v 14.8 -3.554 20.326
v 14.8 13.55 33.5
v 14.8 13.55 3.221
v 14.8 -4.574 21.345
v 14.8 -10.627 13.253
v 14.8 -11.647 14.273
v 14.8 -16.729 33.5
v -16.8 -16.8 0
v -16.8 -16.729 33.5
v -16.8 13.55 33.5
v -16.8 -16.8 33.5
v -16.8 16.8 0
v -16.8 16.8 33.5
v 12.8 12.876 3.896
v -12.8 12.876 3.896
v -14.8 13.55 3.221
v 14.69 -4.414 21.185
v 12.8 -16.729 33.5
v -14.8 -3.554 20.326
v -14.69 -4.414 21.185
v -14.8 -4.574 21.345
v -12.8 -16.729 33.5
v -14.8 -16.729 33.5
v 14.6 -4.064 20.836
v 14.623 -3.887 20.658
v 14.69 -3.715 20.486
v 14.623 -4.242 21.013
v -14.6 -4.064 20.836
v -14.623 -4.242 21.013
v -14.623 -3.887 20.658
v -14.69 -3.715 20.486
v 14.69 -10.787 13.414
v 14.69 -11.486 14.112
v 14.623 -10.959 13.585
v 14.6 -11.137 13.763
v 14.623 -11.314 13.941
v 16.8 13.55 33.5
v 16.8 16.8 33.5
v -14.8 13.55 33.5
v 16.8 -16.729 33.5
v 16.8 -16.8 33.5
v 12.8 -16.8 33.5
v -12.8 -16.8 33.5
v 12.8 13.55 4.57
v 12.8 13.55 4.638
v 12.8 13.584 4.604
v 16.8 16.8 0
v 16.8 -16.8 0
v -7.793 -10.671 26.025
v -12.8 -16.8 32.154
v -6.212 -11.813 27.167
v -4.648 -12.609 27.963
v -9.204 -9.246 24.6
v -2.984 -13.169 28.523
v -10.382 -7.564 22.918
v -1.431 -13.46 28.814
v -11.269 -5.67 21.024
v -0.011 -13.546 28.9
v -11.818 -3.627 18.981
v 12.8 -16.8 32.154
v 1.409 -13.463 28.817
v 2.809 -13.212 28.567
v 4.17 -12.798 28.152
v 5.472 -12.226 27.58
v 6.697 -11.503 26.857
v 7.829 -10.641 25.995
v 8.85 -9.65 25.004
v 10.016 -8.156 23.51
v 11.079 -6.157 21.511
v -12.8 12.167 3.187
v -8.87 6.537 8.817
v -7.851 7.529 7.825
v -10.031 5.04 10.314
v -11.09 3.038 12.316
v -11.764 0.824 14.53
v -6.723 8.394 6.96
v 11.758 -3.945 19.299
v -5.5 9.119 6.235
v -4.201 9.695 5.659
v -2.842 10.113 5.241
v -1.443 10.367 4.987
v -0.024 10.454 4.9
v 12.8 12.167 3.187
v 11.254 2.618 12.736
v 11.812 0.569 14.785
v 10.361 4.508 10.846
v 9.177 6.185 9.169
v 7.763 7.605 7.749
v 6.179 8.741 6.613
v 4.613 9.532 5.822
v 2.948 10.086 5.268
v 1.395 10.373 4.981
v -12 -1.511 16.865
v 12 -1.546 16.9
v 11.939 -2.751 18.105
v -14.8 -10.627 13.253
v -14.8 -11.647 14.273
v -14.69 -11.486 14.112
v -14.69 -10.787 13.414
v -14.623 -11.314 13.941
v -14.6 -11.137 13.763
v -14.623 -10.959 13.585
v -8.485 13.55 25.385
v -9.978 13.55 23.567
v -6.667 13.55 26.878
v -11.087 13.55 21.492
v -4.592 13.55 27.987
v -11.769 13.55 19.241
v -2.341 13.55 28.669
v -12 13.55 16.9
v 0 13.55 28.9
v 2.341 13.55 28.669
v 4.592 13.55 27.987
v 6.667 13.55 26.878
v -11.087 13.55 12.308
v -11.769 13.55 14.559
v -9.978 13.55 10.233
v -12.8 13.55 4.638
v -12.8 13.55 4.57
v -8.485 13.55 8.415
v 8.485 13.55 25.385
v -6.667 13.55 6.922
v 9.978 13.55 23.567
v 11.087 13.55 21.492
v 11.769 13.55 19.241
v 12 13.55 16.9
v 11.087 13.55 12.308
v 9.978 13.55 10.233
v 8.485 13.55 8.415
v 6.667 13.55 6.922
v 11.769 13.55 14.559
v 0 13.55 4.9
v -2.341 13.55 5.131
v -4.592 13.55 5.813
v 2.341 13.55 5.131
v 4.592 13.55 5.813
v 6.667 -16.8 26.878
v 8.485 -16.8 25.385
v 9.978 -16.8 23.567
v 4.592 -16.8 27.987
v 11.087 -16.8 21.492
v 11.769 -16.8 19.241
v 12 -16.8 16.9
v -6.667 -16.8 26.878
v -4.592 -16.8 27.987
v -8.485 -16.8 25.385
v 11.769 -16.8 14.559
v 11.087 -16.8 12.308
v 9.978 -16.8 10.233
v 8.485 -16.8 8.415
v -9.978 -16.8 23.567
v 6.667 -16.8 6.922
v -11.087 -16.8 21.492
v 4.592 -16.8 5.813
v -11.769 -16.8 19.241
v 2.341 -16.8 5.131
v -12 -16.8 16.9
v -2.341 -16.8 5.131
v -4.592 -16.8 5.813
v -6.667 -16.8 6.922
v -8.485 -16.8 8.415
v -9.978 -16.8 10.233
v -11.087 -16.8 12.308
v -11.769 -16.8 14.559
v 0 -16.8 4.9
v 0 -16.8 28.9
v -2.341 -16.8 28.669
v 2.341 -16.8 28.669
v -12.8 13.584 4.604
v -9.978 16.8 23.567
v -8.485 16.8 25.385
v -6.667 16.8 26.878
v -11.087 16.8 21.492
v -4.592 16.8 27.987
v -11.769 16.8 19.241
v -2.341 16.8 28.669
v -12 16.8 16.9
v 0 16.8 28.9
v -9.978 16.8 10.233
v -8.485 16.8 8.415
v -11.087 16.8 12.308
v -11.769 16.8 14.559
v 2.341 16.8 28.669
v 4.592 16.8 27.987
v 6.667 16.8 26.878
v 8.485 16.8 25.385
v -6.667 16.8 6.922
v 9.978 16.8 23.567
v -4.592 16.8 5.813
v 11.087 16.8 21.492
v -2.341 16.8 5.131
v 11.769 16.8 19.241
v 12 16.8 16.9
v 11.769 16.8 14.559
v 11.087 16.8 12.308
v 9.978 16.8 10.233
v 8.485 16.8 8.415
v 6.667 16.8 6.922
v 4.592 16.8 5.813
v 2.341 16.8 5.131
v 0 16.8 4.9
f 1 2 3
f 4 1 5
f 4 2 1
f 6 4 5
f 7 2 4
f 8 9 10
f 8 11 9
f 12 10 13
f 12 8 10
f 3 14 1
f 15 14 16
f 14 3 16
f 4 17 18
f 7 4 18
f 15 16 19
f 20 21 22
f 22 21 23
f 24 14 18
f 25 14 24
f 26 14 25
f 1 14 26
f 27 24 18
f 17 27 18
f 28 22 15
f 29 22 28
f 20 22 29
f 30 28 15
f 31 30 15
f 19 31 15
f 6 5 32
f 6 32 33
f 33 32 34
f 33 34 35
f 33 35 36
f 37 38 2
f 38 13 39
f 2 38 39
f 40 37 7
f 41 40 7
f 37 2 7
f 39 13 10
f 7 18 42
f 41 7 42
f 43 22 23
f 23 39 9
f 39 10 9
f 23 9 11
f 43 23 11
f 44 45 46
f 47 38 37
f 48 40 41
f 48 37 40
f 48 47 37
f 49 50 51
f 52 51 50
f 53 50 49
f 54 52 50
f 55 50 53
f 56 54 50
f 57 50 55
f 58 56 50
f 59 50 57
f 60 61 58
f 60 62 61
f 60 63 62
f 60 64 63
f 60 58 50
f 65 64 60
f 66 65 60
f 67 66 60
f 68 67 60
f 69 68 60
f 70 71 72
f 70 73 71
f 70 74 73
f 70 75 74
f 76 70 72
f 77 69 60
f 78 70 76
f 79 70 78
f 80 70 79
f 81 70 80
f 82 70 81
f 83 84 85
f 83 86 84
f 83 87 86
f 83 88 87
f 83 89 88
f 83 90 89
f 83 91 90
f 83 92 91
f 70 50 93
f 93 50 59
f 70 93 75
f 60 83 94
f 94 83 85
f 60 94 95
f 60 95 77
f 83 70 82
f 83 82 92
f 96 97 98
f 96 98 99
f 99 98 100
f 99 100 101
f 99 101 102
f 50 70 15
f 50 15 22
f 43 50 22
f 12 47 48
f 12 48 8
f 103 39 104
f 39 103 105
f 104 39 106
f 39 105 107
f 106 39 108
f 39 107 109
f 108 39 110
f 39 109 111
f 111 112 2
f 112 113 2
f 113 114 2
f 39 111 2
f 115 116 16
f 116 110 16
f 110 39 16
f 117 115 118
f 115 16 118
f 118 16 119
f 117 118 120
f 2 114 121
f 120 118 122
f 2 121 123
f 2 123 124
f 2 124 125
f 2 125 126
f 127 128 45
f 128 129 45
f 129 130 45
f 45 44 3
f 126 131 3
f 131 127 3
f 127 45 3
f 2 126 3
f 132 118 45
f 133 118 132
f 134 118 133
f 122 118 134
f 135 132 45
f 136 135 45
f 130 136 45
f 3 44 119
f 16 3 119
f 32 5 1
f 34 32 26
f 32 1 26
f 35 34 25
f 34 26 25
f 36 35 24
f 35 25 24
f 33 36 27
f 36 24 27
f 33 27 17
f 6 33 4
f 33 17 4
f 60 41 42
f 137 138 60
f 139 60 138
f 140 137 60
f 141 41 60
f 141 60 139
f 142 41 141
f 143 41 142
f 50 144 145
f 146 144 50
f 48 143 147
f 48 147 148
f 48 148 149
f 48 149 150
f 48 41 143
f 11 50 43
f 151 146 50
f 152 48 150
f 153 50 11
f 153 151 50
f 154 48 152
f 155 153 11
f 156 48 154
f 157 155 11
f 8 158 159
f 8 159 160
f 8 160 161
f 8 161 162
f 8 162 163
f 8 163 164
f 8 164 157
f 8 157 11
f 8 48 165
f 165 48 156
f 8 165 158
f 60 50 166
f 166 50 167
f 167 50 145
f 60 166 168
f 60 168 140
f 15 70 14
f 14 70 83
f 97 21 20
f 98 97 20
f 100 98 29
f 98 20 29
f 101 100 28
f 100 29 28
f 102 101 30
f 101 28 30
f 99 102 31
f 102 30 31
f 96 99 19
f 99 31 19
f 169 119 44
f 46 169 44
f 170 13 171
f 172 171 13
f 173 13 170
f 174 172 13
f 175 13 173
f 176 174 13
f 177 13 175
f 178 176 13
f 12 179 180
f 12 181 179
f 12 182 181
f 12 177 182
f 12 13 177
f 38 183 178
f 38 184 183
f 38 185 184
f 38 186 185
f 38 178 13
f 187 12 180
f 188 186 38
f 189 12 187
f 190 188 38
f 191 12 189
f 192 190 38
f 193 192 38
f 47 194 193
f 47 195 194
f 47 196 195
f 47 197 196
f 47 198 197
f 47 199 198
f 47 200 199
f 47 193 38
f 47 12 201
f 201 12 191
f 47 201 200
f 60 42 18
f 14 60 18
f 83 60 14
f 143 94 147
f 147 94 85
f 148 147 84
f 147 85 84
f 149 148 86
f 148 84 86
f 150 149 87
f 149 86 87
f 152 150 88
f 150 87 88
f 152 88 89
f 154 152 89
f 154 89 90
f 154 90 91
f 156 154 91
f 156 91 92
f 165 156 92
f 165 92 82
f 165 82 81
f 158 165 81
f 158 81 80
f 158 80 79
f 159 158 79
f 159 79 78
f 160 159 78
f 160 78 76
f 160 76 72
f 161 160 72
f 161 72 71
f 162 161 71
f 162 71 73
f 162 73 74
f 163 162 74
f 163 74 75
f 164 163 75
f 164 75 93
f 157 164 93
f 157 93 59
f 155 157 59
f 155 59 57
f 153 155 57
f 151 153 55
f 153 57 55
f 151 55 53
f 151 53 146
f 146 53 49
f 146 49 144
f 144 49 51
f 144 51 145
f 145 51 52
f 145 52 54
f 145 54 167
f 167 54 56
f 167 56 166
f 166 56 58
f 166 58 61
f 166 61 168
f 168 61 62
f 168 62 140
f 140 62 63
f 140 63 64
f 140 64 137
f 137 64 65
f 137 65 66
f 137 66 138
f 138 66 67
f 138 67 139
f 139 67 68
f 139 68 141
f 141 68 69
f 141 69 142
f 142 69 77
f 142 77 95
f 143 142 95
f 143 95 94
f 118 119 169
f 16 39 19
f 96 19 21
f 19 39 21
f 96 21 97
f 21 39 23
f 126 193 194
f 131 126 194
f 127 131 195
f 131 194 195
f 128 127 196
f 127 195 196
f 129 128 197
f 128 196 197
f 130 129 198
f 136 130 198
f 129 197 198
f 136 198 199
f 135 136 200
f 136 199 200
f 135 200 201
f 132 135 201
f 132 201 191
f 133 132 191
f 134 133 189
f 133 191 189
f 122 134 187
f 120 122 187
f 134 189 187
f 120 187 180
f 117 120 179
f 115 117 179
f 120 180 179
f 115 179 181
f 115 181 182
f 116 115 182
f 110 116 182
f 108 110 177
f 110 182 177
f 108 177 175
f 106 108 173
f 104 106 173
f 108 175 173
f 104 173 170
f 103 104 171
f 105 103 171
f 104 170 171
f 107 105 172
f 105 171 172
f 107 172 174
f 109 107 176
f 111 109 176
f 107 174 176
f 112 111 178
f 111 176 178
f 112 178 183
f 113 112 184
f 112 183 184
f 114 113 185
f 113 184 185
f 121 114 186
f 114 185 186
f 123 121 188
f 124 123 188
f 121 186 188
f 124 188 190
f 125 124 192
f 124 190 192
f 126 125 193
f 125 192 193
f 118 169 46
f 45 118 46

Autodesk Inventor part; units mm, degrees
ref_plane "YZ Plane" through (0, 0, 0) normal (1, 0, 0) x (0, 1, 0)
sketch "Sketch1" plane through (0, 0, 0) normal (0, 0, 1) x (1, 0, 0)
  line L0 (-34.86, 0) -> (34.86, 0) construction
  line L1 (0, -34.86) -> (0, 34.86) construction
  line L2 (0, 0) -> (16.9726, 16.9726) construction
  line L3 (0, 0) -> (24.0028, 0) construction
  line L4 (0, 24.9) -> (16.8009, 24.9)
  line L5 (16.8009, 24.9) -> (16.8009, 21.2415)
  line L6 (16.8009, 21.2415) -> (19.0212, 19.0212)
  line L7 (24.9, 0) -> (24.9, 16.8009)
  line L8 (24.9, 16.8009) -> (21.2415, 16.8009)
  line L9 (21.2415, 16.8009) -> (19.0212, 19.0212)
  line L10 (0, -24.9) -> (16.8009, -24.9)
  line L11 (16.8009, -24.9) -> (16.8009, -21.2415)
  line L12 (16.8009, -21.2415) -> (19.0212, -19.0212)
  line L13 (24.9, 0) -> (24.9, -16.8009)
  line L14 (24.9, -16.8009) -> (21.2415, -16.8009)
  line L15 (21.2415, -16.8009) -> (19.0212, -19.0212)
  line L16 (0, 0) -> (-16.9726, 16.9726) construction
  line L17 (0, 0) -> (-24.0028, 0) construction
  line L18 (0, 24.9) -> (-16.8009, 24.9)
  line L19 (-16.8009, 24.9) -> (-16.8009, 21.2415)
  line L20 (-16.8009, 21.2415) -> (-19.0212, 19.0212)
  line L21 (-24.9, 0) -> (-24.9, 16.8009)
  line L22 (-24.9, 16.8009) -> (-21.2415, 16.8009)
  line L23 (-21.2415, 16.8009) -> (-19.0212, 19.0212)
  line L24 (0, -24.9) -> (-16.8009, -24.9)
  line L25 (-16.8009, -24.9) -> (-16.8009, -21.2415)
  line L26 (-16.8009, -21.2415) -> (-19.0212, -19.0212)
  line L27 (-21.2415, -16.8009) -> (-19.0212, -19.0212)
  line L28 (-24.9, -16.8009) -> (-21.2415, -16.8009)
  line L29 (-24.9, 0) -> (-24.9, -16.8009)
  circle A0 centre (0, 0) radius 7.5
  dimension "d17" = 45
  dimension "d18" = 24.9
  dimension "d20" = 3.14
  dimension "d21" = 26.9
  dimension "d22" = 15
extrude "Extrusion1" add sketch "Sketch1" along normal blind 3 contours L4 L5 L6 L9 L8 L7 L13 L14 L15 L12 L11 L10 L24 L25 L26 L27 L28 L29 L21 L22 L23 L20 L19 L18 | A0
sketch "Sketch6" plane through (0, 0, 3) normal (0, 0, 1) x (1, 0, 0)
  line L0 (16.8009, 24.9) -> (-16.8009, 24.9) projected
  line L1 (-16.8009, 24.9) -> (-16.8009, 21.2415) projected
  line L2 (-16.8009, 21.2415) -> (-21.2415, 16.8009) projected
  line L3 (-21.2415, 16.8009) -> (-24.9, 16.8009) projected
  line L4 (-24.9, 16.8009) -> (-24.9, -16.8009) projected
  line L5 (-24.9, -16.8009) -> (-21.2415, -16.8009) projected
  line L6 (-21.2415, -16.8009) -> (-16.8009, -21.2415) projected
  line L7 (-16.8009, -21.2415) -> (-16.8009, -24.9) projected
  line L8 (-16.8009, -24.9) -> (16.8009, -24.9) projected
  line L9 (16.8009, -24.9) -> (16.8009, -21.2415) projected
  line L10 (16.8009, -21.2415) -> (21.2415, -16.8009) projected
  line L11 (21.2415, -16.8009) -> (24.9, -16.8009) projected
  line L12 (24.9, -16.8009) -> (24.9, 16.8009) projected
  line L13 (24.9, 16.8009) -> (21.2415, 16.8009) projected
  line L14 (21.2415, 16.8009) -> (16.8009, 21.2415) projected
  line L15 (16.8009, 21.2415) -> (16.8009, 24.9) projected
  line L16 (24.9, -16.8009) -> (24.9, 16.8009) projected
  line L17 (24.9, 13.5502) -> (-24.9, 13.5502)
  line L18 (-24.9, 16.8009) -> (-24.9, -16.8009) projected
  point P0 (0, 0)
ref_plane "Work Plane2" through (-27.39, -0.0644, 16.8356) normal (0, -0.7071, -0.7071) x (0, 0.7071, -0.7071)
extrude "Extrusion6" add sketch "Sketch6" along normal up to surface contours L12 L11 L10 L9 L8 L7 L6 L5 L4 L17 surface through (-27.39, -0.0644, 16.8356) normal (0, -0.7071, -0.7071)
sketch "Sketch7" plane through (-16.8009, -24.9, 0) normal (0, -1, 0) x (1, 0, 0)
  line L0 (-0.0991, 33.8) -> (0.8009, 33.8) projected
  arc A0 (-6.0991, 41.8) -> (-8.0991, 39.8) centre (-6.0991, 39.8) ccw projected
  arc A1 (41.7009, 39.8) -> (39.7009, 41.8) centre (39.7009, 39.8) ccw projected
  line L1 (41.9057, 41.8) -> (-10.6447, 41.8)
  line L2 (-10.6447, 41.8) -> (-10.6447, 33.8)
  line L3 (-10.6447, 33.8) -> (41.9057, 33.8)
  line L4 (41.9057, 33.8) -> (41.9057, 41.8)
  point P0 (16.8009, 0)
extrude "Extrusion7" cut sketch "Sketch7" against normal through all
sketch "Sketch8" plane through (21.2415, -16.8009, 0) normal (0, -1, 0) x (1, 0, 0)
  line L0 (-8.7415, 0) -> (-33.7415, 0) projected
  line L1 (-33.7415, -1) -> (-8.7415, -1) projected
  line L2 (-46.1415, 33.572) -> (-42.483, 33.572) projected
  line L3 (3.6585, 33.8) -> (0.0423, 33.8) projected
  line L4 (0, 33.572) -> (3.6585, 33.572) projected
  line L5 (-46.1415, 3.2209) -> (-46.1415, 33.572) projected
  line L6 (3.6585, 33.572) -> (-46.1415, 33.572)
  line L7 (-46.1415, 33.572) -> (-46.1415, 30.572)
  line L8 (-46.1415, 30.572) -> (3.6585, 30.572)
  line L9 (3.6585, 30.572) -> (3.6585, 33.572)
  dimension "d45" = 3
sketch "Sketch9" plane through (-16.8009, -24.9, 0) normal (0, -1, 0) x (1, 0, 0)
  line L0 (33.7009, 0) -> (33.0009, 0) construction
  line L1 (36.0327, -6) -> (22.7009, -6) construction
  circle A0 centre (16.8009, 16.9) radius 16.9 construction
  circle A1 centre (16.8009, 16.9) radius 7.5
  line L2 (39.7009, 8.1978) -> (33.7009, 8.1978) projected
  line L3 (33.7009, 8.1978) -> (33.7009, 0) projected
  line L4 (33.0009, 0) -> (33.0009, -3.7) projected
  line L5 (33.0009, -3.7) -> (22.7009, -3.7) projected
  line L6 (22.7009, -3.7) -> (22.7009, -6) projected
  arc A2 (39.7009, -2.3319) -> (36.0327, -6) centre (36.8009, -3.1) ccw projected
  line L7 (39.7009, 8.1978) -> (39.7009, -2.3319) projected
  point P0 (16.8009, 0)
  dimension "d46" = 15
extrude "Extrusion8" cut sketch "Sketch9" against normal through all
sketch "Sketch10" plane through (-16.8009, -24.9, 0) normal (0, -1, 0) x (1, 0, 0)
  circle A0 centre (16.8009, 16.9) radius 7.5 projected
  circle A1 centre (16.8009, 16.9) radius 12.75
  point P0 (16.8009, 0)
  dimension "d49" = 25.5
extrude "Extrusion9" cut sketch "Sketch10" against normal blind 7
sketch "Sketch12" plane through (-24.9, 13.5502, 3.2209) normal (0, 0.7071, 0.7071) x (1, 0, 0)
  line L0 (32.9, -31.2053) -> (32.9, -6.2053) construction
  line L1 (32.9, -6.2053) -> (16.9, -6.2053) construction
  line L2 (16.9, -6.2053) -> (16.9, -31.2053) construction
  line L3 (16.9, -31.2053) -> (32.9, -31.2053) construction
  line L4 (37.7, -37.554) -> (12.1, -37.554)
  line L5 (12.1, -37.554) -> (12.1, -0.954)
  line L6 (12.1, -0.954) -> (37.7, -0.954)
  line L7 (37.7, -0.954) -> (37.7, -37.554)
  line L8 (37.7, -37.554) -> (12.1, -0.954) construction
  line L9 (12.1, -37.554) -> (37.7, -0.954) construction
  line L10 (10.6, -39.054) -> (39.2, -39.054)
  line L11 (39.2, -39.054) -> (39.2, 0.546)
  line L12 (39.2, 0.546) -> (10.6, 0.546)
  line L13 (10.6, 0.546) -> (10.6, -39.054)
  point P0 (24.9, -19.254)
  point P1 (24.9, -8.7385)
  point P2 (24.9, -8.7385)
  dimension "d81" = 25.6
  dimension "d82" = 36.6
  dimension "d83" = 1.5
sketch "Sketch13" plane through (0, 0, 3) normal (0, 0, 1) x (1, 0, 0)
  line L0 (24.9, 13.5502) -> (24.9, 16.8009) projected
  line L1 (24.9, 16.8009) -> (21.2415, 16.8009) projected
  line L2 (21.2415, 16.8009) -> (16.8009, 21.2415) projected
  line L3 (16.8009, 21.2415) -> (16.8009, 24.9) projected
  line L4 (16.8009, 24.9) -> (-16.8009, 24.9) projected
  line L5 (-16.8009, 24.9) -> (-16.8009, 21.2415) projected
  line L6 (-16.8009, 21.2415) -> (-21.2415, 16.8009) projected
  line L7 (-21.2415, 16.8009) -> (-24.9, 16.8009) projected
  line L8 (-24.9, 16.8009) -> (-24.9, 13.5502) projected
  line L9 (-24.9, 13.5502) -> (24.9, 13.5502) projected
  point P0 (0, 0)
ref_plane "Work Plane3" through (-16.9, 21.1423, 33.8) normal (0, 0, -1) x (0, 1, 0)
extrude "Extrusion12" add sketch "Sketch13" along normal up to surface (30.8 mm away)
sketch "Sketch14" plane through (-16.8009, 24.9, 0) normal (0, 1, 0) x (1, 0, 0)
  line L0 (-0.0991, -33.8) -> (-0.0991, 0) construction
  line L1 (33.6017, -33.8) -> (0, -33.8) projected
  line L2 (0, 0) -> (33.6017, 0) projected
  line L3 (33.6017, 0) -> (33.6017, -33.8) projected
  arc A0 (16.8009, -9.4) -> (16.8009, -9.4) centre (16.8009, -16.9) ccw construction
  circle A1 centre (16.8009, -16.9) radius 12.75
  point P0 (16.8009, 0)
  dimension "d61" = 25.5
extrude "Extrusion13" cut sketch "Sketch14" against normal blind 7
sketch "Sketch15" plane through (0, 17.9, 16.9) normal (0, 1, 0) x (1, 0, 0)
  circle A0 centre (0, 0) radius 7.5 projected
  circle A1 centre (0, 0) radius 12
  point P0 (0, 16.9)
  dimension "d84" = 24
extrude "Extrusion14" cut sketch "Sketch15" against normal through all contours A0 | A1
sketch "Sketch16" plane through (21.2415, -16.8009, 33.572) normal (0, 0.7071, 0.7071) x (1, 0, 0)
  line L0 (-42.255, -0.3224) -> (-0.228, -0.3224) projected
  line L1 (-0.228, -0.3224) -> (0, 0) projected
  line L2 (0, 0) -> (3.6585, 0) projected
  line L3 (3.6585, 0) -> (3.6585, 42.9229) projected
  line L4 (-46.1415, 42.9229) -> (-46.1415, 0) projected
  line L5 (-46.1415, 0) -> (-42.483, 0) projected
  line L6 (-42.483, 0) -> (-42.255, -0.3224) projected
  line L7 (-4.4406, 18.0121) -> (-38.0423, 18.0121) projected
  circle A0 centre (-37.2415, 18.0121) radius 1.4
  circle A1 centre (-5.2415, 18.0121) radius 1.4
  line L8 (3.6585, 42.9229) -> (-46.1415, 42.9229) projected
  ellipse E0 centre (-21.2415, 23.5778) end of major axis (-21.2415, 40.5484) minor radius 12 projected
  point P0 (-21.2415, 35.619)
  dimension "d68" = 2.8
  dimension "d69" = 2.8
  dimension "d85" = 16
extrude "Extrusion15" cut sketch "Sketch16" against normal blind 10 contours A0 | A1
sketch "Sketch17" plane through (-24.9, -16.8009, 0) normal (-1, 0, 0) x (0, 0, 1)
  line L0 (43.2726, 50.002) -> (33.5, 50.002)
  line L1 (33.5, 50.002) -> (33.5, -21.818)
  line L2 (33.5, -21.818) -> (43.2726, -21.818)
  line L3 (43.2726, -21.818) -> (43.2726, 50.002)
  line L4 (0, 0) -> (0, 33.6017) projected
  point P0 (0, 16.8009)
  dimension "d72" = 33.5
extrude "Extrusion16" cut sketch "Sketch17" against normal through all
ref_plane "Work Plane4" through (-12.8, -13.0045, 29.7756) normal (0, 0.7071, 0.7071) x (1, 0, 0)
sketch "Sketch19" plane through (-12.8, -13.0045, 29.7756) normal (0, 0.7071, 0.7071) x (1, 0, 0)
  line L0 (0, 36.554) -> (-1.5, 36.554) projected
  line L1 (-1.5, 36.554) -> (-1.5, -1.5) projected
  line L2 (-1.5, -1.5) -> (27.1, -1.5) projected
  line L3 (27.1, -1.5) -> (27.1, 36.554) projected
  line L4 (27.1, 36.554) -> (25.6, 36.554) projected
  line L5 (25.6, 36.554) -> (25.6, 0) projected
  line L6 (25.6, 0) -> (0, 0) projected
  line L7 (0, 0) -> (0, 36.554) projected
  line L8 (25.6, 0) -> (25.6, 36.6) projected
  line L9 (0, 0) -> (25.6, 0) projected
  line L10 (0, 36.6) -> (0, 0) projected
  line L11 (25.6, -1.5) -> (0, -1.5)
  line L12 (0, -1.5) -> (0, 36.6)
  line L13 (0, 36.6) -> (25.6, 36.6)
  line L14 (25.6, 36.6) -> (25.6, -1.5)
  line L15 (25.6, -1.5) -> (0, -1.5)
  line L16 (0, -1.5) -> (0, -6.2491)
  line L17 (0, -6.2491) -> (25.6, -6.2491)
  line L18 (25.6, -6.2491) -> (25.6, -1.5)
  point P0 (12.8, 30.2501)
extrude "Extrusion18" cut sketch "Sketch19" along normal mid plane 2 contours L10 L13 L8 L5 L6 L7 | L6 L14 L2 L12 | L2 L18 L17 L16
sketch "Sketch21" plane through (0, 0, 0) normal (0, 0, -1) x (-1, 0, 0)
  line L0 (16.8009, -24.9) -> (16.8009, -21.2415) projected
  line L1 (16.8009, -21.2415) -> (21.2415, -16.8009) projected
  line L2 (21.2415, -16.8009) -> (24.9, -16.8009) projected
  line L3 (24.9, -16.8009) -> (24.9, 16.8009) projected
  line L4 (24.9, 16.8009) -> (21.2415, 16.8009) projected
  line L5 (21.2415, 16.8009) -> (16.8009, 21.2415) projected
  line L6 (16.8009, 21.2415) -> (16.8009, 24.9) projected
  line L7 (16.8009, 24.9) -> (-16.8009, 24.9) projected
  line L8 (-16.8009, 24.9) -> (-16.8009, 21.2415) projected
  line L9 (-16.8009, 21.2415) -> (-21.2415, 16.8009) projected
  line L10 (-21.2415, 16.8009) -> (-24.9, 16.8009) projected
  line L11 (-24.9, 16.8009) -> (-24.9, -16.8009) projected
  line L12 (-24.9, -16.8009) -> (-21.2415, -16.8009) projected
  line L13 (-21.2415, -16.8009) -> (-16.8009, -21.2415) projected
  line L14 (-16.8009, -21.2415) -> (-16.8009, -24.9) projected
  line L15 (-16.8009, -24.9) -> (16.8009, -24.9) projected
  line L16 (-16.8, -16.8) -> (16.8, -16.8)
  line L17 (16.8, -16.8) -> (16.8, 16.8)
  line L18 (16.8, 16.8) -> (-16.8, 16.8)
  line L19 (-16.8, 16.8) -> (-16.8, -16.8)
  line L20 (-16.8, -16.8) -> (16.8, 16.8) construction
  line L21 (16.8, -16.8) -> (-16.8, 16.8) construction
  point P0 (0, 0)
  point P1 (0, 0)
  dimension "d92" = 33.6
  dimension "d93" = 33.6
extrude "Extrusion20" cut sketch "Sketch21" against normal through all contours L19 L18 L17 L16 keep common part
sketch "Sketch22" plane through (-16.8, 16.8, 33.5) normal (0, 0, 1) x (1, 0, 0)
  line L0 (33.6, -33.5288) -> (33.6, -33.6) projected
  line L1 (0, 0) -> (33.6, 0) projected
  line L2 (0, -33.6) -> (0, -33.5288) projected
  line L3 (41.7, -33.6009) -> (-8.1, -33.6009) projected
  line L4 (33.6, 0) -> (33.6, -33.6) projected
  line L5 (29.6, -33.5288) -> (33.6, -33.5288) projected
  line L6 (33.6, 0) -> (31.6, 0)
  line L7 (31.6, 0) -> (31.6, -33.5288)
  line L8 (31.6, -33.5288) -> (33.6, -33.5288)
  line L9 (33.6, -33.5288) -> (33.6, 0)
  line L10 (33.6, 0) -> (0, 0) projected
  line L11 (0, -33.5288) -> (4, -33.5288) projected
  line L12 (0, 0) -> (2, 0)
  line L13 (2, 0) -> (2, -33.5288)
  line L14 (2, -33.5288) -> (0, -33.5288)
  line L15 (0, -33.5288) -> (0, 0)
  line L16 (33.6, -33.6) -> (29.6, -33.6) projected
  line L17 (4, -33.6) -> (0, -33.6) projected
  line L18 (4, -33.6) -> (4, -33.5288) projected
  line L19 (29.6, -33.5288) -> (29.6, -33.6) projected
  line L20 (29.6, -33.5288) -> (33.6, -33.5288) projected
  line L21 (33.6, 0) -> (33.6, -3.2498) projected
  line L22 (0, -3.2498) -> (0, 0) projected
  line L23 (33.6, -3.2498) -> (0, -3.2498) projected
  line L24 (0, -33.5288) -> (4, -33.5288) projected
  point P0 (16.8, -16.8)
  point P1 (33.6, -3.2498)
  point P2 (2, 0)
extrude "Extrusion21" add sketch "Sketch22" against normal up to surface (33.5 mm away) contours L5 L7 L23 L4 | L23 L7 L1 L4 | L3 L2 L11 L18 | L23 L15 L1 L13 | L13 L11 L15 L23
properties part number "20_Cube_Insert_Beamsplittercube_Base_25x35_v3"
